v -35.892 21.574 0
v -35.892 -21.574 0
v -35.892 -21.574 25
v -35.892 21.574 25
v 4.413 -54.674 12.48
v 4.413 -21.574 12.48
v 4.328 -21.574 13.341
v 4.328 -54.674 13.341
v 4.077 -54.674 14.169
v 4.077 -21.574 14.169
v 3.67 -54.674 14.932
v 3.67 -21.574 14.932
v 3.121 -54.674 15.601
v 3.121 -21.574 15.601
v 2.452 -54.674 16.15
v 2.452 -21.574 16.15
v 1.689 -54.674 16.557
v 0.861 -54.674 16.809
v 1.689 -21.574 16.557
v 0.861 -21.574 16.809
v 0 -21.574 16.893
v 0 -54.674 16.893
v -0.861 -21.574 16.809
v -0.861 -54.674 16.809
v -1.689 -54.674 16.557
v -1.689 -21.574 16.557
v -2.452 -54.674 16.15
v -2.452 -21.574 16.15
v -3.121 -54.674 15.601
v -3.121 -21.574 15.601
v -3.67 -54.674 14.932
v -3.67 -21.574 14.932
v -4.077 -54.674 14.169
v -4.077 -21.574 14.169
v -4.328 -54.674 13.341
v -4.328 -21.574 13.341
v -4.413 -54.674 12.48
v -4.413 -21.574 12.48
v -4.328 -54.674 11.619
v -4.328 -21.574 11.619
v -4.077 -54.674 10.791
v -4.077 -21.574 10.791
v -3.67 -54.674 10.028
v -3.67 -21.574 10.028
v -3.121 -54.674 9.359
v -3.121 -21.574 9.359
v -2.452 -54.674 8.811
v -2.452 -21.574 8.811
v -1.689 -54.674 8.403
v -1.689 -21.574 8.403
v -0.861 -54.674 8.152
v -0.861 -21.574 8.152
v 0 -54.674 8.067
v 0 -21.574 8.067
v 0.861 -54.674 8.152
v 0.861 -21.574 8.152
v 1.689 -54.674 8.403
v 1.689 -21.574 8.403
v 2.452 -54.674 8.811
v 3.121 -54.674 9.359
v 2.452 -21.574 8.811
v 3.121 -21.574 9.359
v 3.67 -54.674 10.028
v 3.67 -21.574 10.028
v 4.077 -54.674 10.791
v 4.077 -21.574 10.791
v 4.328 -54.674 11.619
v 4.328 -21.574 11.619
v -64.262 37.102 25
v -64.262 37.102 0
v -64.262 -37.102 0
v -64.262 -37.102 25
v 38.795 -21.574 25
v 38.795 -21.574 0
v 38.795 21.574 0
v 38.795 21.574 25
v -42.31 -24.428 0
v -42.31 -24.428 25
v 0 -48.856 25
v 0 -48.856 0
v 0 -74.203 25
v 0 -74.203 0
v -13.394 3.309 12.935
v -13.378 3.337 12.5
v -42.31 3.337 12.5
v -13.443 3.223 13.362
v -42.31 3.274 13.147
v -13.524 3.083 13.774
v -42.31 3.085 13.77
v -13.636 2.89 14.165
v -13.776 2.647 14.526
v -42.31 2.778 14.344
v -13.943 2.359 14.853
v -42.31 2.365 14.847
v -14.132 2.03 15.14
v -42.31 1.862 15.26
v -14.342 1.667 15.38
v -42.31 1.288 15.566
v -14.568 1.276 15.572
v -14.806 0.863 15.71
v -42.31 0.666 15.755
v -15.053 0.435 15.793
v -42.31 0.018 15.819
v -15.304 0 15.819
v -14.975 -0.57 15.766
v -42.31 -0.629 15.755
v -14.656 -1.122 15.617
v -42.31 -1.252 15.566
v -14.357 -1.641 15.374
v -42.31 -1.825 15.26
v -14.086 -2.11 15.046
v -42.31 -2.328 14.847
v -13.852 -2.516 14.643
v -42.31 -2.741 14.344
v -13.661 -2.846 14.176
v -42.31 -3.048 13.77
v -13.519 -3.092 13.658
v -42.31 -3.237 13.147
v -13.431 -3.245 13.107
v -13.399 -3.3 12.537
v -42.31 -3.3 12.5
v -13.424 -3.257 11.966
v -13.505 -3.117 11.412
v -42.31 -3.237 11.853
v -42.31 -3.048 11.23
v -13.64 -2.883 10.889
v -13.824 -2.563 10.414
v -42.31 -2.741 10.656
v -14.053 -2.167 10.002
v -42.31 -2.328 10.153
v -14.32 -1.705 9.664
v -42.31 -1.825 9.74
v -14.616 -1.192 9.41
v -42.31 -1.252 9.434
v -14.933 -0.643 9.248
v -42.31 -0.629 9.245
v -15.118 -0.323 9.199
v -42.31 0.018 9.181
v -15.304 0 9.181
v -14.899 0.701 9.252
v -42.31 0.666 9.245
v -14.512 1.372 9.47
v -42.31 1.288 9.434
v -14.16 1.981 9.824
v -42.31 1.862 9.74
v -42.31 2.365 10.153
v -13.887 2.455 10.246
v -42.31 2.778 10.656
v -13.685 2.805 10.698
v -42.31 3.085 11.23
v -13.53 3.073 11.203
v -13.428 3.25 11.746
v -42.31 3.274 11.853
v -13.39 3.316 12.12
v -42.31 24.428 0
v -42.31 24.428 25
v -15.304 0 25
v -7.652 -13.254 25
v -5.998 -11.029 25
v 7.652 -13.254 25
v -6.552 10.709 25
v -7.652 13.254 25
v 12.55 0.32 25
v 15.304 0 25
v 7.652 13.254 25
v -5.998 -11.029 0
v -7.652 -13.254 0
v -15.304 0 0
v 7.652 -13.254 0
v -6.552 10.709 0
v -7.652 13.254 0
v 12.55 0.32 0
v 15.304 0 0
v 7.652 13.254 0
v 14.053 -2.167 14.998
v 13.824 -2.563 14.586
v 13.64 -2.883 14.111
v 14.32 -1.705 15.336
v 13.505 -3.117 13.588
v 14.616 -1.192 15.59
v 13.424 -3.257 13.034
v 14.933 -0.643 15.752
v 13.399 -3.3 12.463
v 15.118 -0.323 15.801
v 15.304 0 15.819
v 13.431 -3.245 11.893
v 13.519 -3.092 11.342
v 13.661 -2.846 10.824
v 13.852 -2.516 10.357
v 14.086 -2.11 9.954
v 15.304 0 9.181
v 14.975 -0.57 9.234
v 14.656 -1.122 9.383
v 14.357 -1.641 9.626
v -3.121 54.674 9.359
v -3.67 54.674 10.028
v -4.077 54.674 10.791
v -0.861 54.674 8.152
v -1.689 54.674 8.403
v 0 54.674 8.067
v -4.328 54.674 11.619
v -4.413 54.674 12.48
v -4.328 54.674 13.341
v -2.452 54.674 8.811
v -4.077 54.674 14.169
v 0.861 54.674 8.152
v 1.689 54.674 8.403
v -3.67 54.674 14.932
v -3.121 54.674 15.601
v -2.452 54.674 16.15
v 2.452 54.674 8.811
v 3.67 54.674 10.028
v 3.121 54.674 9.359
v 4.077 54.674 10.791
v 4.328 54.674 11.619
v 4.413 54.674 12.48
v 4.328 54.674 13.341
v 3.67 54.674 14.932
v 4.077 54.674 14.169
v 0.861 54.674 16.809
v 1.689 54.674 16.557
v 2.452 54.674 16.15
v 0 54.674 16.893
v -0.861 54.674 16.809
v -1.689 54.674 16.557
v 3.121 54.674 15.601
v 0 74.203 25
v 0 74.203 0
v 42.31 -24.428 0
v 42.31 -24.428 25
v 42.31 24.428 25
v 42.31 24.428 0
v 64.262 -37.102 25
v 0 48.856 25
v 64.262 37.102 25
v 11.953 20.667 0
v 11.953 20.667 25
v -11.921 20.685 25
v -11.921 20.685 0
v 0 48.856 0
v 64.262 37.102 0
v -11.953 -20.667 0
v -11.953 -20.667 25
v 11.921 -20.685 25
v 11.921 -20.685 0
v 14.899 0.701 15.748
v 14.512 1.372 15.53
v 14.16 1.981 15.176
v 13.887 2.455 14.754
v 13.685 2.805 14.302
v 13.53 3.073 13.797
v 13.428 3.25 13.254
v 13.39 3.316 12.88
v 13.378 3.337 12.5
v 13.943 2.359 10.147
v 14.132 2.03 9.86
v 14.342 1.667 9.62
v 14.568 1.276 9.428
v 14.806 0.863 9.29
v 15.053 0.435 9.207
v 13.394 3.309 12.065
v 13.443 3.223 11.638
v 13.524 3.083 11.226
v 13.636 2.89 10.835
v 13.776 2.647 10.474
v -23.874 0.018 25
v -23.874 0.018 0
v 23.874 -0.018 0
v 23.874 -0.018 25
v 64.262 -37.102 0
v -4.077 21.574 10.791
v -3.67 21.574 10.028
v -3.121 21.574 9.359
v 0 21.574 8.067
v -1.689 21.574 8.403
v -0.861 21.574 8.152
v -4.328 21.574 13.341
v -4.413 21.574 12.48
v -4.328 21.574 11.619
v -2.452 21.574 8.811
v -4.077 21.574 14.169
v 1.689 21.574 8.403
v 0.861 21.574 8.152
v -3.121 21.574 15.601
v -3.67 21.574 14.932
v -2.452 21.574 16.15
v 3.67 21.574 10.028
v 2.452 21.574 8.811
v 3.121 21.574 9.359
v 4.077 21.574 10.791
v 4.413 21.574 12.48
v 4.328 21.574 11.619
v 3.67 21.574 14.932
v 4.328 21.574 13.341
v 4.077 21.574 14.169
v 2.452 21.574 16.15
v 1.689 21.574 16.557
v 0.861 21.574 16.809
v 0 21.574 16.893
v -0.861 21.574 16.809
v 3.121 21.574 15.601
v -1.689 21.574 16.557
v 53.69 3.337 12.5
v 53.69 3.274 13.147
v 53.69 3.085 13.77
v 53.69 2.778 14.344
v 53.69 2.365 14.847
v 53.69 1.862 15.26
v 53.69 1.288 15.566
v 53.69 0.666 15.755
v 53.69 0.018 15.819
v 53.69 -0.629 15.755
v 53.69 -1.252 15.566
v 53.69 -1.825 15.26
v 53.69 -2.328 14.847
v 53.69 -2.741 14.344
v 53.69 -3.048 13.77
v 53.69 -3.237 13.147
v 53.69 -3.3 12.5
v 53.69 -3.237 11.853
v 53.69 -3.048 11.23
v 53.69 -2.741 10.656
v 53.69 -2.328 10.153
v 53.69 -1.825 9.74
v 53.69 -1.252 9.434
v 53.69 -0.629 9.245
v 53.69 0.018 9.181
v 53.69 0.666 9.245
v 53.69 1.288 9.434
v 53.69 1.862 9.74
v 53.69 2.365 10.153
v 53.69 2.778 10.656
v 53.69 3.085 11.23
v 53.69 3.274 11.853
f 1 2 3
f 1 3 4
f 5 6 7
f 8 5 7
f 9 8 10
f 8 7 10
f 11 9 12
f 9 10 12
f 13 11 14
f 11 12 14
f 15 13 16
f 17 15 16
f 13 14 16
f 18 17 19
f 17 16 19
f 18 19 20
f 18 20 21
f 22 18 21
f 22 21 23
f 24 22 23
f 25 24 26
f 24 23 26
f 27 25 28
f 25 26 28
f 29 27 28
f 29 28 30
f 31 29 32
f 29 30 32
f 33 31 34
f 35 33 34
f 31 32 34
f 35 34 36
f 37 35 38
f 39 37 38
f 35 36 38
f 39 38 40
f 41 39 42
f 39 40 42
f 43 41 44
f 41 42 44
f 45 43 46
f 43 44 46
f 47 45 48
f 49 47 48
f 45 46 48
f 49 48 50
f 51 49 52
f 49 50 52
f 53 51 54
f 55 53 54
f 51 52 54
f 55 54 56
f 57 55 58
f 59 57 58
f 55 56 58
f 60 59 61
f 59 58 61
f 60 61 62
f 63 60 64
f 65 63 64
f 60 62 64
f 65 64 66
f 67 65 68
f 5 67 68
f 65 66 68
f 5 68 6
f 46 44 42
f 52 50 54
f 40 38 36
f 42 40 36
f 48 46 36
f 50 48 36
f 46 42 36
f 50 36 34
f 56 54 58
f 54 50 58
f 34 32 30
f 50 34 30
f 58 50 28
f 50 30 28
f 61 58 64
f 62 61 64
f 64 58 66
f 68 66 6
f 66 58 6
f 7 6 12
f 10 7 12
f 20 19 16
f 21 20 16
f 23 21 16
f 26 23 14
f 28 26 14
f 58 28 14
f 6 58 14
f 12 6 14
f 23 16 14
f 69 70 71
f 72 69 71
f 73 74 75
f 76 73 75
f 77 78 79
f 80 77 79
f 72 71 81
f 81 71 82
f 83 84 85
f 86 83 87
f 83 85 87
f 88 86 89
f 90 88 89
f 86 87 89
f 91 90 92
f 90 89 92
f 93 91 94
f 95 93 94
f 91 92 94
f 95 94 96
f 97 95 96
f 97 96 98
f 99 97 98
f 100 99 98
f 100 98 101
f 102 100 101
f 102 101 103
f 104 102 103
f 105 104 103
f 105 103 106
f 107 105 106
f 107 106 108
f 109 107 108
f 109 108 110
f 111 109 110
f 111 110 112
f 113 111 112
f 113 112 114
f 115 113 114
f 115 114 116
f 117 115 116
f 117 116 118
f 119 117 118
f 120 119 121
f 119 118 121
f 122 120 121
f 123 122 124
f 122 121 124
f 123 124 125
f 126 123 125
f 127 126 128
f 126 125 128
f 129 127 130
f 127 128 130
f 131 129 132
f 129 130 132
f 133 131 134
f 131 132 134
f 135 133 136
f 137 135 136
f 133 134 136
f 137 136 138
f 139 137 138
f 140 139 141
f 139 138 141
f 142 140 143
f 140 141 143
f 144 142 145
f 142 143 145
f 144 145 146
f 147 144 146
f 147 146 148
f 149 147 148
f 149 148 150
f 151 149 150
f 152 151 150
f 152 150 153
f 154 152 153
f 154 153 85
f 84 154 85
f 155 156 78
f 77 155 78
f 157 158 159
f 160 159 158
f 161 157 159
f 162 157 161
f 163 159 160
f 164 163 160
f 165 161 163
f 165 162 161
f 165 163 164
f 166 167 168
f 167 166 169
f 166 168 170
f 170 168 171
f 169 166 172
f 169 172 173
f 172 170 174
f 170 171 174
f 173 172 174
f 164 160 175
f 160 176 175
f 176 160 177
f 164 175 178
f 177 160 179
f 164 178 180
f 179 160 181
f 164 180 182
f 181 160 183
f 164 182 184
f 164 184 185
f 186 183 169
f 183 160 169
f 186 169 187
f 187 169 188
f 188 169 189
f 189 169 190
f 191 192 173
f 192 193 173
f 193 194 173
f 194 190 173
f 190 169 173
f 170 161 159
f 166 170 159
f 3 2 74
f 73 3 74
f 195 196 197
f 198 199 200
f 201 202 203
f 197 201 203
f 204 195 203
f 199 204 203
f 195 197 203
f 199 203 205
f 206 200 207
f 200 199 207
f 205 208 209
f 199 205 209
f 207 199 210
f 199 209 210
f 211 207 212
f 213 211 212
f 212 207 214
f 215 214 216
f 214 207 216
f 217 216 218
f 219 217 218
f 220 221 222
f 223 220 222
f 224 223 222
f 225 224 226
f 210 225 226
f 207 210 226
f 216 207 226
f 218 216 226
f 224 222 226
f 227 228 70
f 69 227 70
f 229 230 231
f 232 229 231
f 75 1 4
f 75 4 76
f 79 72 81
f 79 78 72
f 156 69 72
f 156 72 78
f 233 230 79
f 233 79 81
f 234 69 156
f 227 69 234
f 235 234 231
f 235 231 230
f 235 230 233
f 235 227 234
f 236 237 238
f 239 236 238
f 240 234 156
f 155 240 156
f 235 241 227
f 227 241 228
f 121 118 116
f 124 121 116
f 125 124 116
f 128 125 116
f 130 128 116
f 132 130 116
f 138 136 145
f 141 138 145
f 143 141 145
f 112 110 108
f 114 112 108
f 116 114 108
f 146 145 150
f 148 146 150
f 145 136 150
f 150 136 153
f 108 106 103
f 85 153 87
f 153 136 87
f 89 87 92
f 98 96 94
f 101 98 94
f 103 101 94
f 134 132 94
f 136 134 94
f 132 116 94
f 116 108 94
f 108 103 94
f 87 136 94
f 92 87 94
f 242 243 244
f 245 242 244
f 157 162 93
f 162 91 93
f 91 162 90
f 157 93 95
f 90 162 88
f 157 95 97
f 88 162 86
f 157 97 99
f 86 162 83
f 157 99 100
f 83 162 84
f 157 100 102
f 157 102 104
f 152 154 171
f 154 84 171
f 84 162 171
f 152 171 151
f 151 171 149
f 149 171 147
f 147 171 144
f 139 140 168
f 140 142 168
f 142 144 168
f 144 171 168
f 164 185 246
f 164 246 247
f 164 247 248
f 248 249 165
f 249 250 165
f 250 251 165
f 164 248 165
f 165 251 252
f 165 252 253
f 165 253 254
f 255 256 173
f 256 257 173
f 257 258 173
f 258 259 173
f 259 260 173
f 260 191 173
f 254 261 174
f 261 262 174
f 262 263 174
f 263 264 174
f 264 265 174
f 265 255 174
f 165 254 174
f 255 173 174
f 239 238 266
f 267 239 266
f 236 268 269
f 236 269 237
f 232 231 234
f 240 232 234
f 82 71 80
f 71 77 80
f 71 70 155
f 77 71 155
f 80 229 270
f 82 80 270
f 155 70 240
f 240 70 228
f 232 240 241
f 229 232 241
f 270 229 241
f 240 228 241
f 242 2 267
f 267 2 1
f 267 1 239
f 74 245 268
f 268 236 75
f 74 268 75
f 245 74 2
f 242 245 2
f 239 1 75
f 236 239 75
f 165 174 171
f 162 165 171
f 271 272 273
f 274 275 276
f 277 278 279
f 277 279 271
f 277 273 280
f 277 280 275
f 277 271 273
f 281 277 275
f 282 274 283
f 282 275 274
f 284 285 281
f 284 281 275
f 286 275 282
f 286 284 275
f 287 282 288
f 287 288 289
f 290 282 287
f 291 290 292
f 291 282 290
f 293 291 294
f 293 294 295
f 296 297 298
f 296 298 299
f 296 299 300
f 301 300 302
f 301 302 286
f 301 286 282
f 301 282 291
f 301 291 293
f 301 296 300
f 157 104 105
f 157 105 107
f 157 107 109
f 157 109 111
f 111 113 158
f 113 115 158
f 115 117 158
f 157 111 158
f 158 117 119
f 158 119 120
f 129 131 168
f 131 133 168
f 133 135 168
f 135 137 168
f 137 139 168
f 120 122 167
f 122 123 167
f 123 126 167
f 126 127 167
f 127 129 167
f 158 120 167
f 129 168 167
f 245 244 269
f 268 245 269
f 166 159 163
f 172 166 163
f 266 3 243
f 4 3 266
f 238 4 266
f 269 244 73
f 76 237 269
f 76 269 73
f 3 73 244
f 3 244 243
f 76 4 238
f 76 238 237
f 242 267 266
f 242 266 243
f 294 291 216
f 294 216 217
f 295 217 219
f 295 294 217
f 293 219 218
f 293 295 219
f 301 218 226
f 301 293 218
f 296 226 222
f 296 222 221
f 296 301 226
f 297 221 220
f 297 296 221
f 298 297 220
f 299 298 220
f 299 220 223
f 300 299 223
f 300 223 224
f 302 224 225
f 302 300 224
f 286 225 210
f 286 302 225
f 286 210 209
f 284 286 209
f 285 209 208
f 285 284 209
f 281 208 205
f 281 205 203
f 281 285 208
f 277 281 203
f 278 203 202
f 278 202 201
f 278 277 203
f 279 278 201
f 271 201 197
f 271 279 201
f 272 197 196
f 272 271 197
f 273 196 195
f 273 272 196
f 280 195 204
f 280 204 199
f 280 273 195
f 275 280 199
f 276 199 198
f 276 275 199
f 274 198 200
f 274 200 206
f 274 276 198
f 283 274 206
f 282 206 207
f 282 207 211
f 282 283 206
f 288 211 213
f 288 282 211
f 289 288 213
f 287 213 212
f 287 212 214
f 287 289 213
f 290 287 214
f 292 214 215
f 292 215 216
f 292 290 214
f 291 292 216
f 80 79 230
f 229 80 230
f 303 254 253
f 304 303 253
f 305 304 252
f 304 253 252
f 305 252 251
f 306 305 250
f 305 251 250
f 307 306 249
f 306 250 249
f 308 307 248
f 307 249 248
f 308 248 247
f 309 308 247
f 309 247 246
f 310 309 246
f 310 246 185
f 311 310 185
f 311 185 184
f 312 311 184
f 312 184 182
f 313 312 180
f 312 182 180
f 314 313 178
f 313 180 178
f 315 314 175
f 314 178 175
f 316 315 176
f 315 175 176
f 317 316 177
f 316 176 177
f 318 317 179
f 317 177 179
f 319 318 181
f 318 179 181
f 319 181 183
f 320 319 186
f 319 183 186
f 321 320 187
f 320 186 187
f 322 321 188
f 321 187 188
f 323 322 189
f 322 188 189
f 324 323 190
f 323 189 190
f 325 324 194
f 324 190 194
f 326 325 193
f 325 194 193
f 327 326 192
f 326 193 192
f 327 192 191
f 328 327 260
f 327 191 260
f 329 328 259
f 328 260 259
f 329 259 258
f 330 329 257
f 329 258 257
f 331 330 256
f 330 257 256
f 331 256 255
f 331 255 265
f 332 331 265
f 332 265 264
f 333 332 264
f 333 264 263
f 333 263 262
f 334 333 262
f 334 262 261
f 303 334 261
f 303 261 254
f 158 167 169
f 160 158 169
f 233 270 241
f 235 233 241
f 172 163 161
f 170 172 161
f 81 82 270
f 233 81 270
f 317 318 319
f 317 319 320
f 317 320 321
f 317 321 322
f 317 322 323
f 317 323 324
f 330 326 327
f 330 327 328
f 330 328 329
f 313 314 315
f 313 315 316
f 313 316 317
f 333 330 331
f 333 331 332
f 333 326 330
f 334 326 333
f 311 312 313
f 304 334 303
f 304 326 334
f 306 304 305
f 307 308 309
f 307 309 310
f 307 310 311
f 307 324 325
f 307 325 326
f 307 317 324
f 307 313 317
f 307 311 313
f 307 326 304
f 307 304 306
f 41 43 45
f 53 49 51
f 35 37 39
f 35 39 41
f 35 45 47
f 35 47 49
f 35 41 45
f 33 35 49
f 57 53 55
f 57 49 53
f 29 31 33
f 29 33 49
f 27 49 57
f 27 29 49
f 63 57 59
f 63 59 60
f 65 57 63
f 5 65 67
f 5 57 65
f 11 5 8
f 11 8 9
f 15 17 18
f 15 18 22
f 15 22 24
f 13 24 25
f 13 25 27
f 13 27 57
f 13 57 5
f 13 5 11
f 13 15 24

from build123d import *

# Parameters (mm, degrees)
F1_DEPTH  = 25
F3_DEPTH  = 35.3
F4_W      = 74.686735
F4_H      = 43.148034
F5_DEPTH  = 25
F6_R      = 4.413287
F7_DEPTH  = 33.1
F10_DEPTH = 33.1
F11_R     = 3.318896
F12_DEPTH = 96
F14_DEPTH = 25
F16_DEPTH = 25


with BuildPart() as f1:
    # F0 (on Top) → F1 (new body)
    with BuildSketch(Plane.XY):
        Polygon((64.261695, 37.101507), (0, 74.203014), (-64.261695, 37.101507), (-64.261695, -37.101507), (0, -74.203014), (64.261695, -37.101507), align=None)
    extrude(amount=F1_DEPTH)

    # F2 (on face) → F3 (cut)
    with BuildSketch(Plane.XY.offset(25)):
        Polygon((42.3105, 24.427978), (0, 48.855957), (-42.3105, 24.427978), (-42.3105, -24.427978), (0, -48.855957), (42.3105, -24.427978), align=None)
    extrude(amount=-F3_DEPTH, mode=Mode.SUBTRACT)


with BuildPart() as f5:
    # F4 (on Top) → F5 (new body)
    with BuildSketch(Plane.XY):
        with Locations((1.451168, 0)):
            Rectangle(F4_W, F4_H)
    extrude(amount=F5_DEPTH)

    # F9 (on face) → F10 (cut)
    with BuildSketch(Plane.XY.offset(25)):
        Polygon((-11.921194, 20.684916), (-23.87426, 0.018401), (-11.953066, -20.666515), (11.921194, -20.684916), (23.87426, -0.018401), (11.953066, 20.666515), align=None)
    extrude(amount=-F10_DEPTH, mode=Mode.SUBTRACT)


with BuildPart() as f7:
    # F6 (on face) → F7 (new body)
    with BuildSketch(Plane.XZ.offset(21.574017)):
        with Locations((0, 12.480038)):
            Circle(F6_R)
    extrude(amount=F7_DEPTH)


with BuildPart() as f8_1:
    # F8: instance of F7
    add(f7.part.mirror(Plane.XZ))


with BuildPart() as f12:
    # F11 (on face) → F12 (new body)
    with BuildSketch(Plane.YZ.offset(-42.3105)):
        with Locations((0.018401, 12.5)):
            Circle(F11_R)
    extrude(amount=F12_DEPTH)

    # F13 (on Top) → F14 (join)
    with BuildSketch(Plane.XY):
        Polygon((7.652197, 13.253993), (-7.652197, 13.253993), (-15.304393, 0), (-7.652197, -13.253993), (7.652197, -13.253993), (15.304393, 0), align=None)
    extrude(amount=F14_DEPTH)

    # F15 (on face) → F16 (cut)
    with BuildSketch(Plane.XY.offset(25)):
        Polygon((12.550362, 0.319878), (-6.552203, 10.708993), (-5.998158, -11.028871), align=None)
    extrude(amount=-F16_DEPTH, mode=Mode.SUBTRACT)


solid = Compound([f1.part, f5.part, f7.part, f8_1.part, f12.part])
